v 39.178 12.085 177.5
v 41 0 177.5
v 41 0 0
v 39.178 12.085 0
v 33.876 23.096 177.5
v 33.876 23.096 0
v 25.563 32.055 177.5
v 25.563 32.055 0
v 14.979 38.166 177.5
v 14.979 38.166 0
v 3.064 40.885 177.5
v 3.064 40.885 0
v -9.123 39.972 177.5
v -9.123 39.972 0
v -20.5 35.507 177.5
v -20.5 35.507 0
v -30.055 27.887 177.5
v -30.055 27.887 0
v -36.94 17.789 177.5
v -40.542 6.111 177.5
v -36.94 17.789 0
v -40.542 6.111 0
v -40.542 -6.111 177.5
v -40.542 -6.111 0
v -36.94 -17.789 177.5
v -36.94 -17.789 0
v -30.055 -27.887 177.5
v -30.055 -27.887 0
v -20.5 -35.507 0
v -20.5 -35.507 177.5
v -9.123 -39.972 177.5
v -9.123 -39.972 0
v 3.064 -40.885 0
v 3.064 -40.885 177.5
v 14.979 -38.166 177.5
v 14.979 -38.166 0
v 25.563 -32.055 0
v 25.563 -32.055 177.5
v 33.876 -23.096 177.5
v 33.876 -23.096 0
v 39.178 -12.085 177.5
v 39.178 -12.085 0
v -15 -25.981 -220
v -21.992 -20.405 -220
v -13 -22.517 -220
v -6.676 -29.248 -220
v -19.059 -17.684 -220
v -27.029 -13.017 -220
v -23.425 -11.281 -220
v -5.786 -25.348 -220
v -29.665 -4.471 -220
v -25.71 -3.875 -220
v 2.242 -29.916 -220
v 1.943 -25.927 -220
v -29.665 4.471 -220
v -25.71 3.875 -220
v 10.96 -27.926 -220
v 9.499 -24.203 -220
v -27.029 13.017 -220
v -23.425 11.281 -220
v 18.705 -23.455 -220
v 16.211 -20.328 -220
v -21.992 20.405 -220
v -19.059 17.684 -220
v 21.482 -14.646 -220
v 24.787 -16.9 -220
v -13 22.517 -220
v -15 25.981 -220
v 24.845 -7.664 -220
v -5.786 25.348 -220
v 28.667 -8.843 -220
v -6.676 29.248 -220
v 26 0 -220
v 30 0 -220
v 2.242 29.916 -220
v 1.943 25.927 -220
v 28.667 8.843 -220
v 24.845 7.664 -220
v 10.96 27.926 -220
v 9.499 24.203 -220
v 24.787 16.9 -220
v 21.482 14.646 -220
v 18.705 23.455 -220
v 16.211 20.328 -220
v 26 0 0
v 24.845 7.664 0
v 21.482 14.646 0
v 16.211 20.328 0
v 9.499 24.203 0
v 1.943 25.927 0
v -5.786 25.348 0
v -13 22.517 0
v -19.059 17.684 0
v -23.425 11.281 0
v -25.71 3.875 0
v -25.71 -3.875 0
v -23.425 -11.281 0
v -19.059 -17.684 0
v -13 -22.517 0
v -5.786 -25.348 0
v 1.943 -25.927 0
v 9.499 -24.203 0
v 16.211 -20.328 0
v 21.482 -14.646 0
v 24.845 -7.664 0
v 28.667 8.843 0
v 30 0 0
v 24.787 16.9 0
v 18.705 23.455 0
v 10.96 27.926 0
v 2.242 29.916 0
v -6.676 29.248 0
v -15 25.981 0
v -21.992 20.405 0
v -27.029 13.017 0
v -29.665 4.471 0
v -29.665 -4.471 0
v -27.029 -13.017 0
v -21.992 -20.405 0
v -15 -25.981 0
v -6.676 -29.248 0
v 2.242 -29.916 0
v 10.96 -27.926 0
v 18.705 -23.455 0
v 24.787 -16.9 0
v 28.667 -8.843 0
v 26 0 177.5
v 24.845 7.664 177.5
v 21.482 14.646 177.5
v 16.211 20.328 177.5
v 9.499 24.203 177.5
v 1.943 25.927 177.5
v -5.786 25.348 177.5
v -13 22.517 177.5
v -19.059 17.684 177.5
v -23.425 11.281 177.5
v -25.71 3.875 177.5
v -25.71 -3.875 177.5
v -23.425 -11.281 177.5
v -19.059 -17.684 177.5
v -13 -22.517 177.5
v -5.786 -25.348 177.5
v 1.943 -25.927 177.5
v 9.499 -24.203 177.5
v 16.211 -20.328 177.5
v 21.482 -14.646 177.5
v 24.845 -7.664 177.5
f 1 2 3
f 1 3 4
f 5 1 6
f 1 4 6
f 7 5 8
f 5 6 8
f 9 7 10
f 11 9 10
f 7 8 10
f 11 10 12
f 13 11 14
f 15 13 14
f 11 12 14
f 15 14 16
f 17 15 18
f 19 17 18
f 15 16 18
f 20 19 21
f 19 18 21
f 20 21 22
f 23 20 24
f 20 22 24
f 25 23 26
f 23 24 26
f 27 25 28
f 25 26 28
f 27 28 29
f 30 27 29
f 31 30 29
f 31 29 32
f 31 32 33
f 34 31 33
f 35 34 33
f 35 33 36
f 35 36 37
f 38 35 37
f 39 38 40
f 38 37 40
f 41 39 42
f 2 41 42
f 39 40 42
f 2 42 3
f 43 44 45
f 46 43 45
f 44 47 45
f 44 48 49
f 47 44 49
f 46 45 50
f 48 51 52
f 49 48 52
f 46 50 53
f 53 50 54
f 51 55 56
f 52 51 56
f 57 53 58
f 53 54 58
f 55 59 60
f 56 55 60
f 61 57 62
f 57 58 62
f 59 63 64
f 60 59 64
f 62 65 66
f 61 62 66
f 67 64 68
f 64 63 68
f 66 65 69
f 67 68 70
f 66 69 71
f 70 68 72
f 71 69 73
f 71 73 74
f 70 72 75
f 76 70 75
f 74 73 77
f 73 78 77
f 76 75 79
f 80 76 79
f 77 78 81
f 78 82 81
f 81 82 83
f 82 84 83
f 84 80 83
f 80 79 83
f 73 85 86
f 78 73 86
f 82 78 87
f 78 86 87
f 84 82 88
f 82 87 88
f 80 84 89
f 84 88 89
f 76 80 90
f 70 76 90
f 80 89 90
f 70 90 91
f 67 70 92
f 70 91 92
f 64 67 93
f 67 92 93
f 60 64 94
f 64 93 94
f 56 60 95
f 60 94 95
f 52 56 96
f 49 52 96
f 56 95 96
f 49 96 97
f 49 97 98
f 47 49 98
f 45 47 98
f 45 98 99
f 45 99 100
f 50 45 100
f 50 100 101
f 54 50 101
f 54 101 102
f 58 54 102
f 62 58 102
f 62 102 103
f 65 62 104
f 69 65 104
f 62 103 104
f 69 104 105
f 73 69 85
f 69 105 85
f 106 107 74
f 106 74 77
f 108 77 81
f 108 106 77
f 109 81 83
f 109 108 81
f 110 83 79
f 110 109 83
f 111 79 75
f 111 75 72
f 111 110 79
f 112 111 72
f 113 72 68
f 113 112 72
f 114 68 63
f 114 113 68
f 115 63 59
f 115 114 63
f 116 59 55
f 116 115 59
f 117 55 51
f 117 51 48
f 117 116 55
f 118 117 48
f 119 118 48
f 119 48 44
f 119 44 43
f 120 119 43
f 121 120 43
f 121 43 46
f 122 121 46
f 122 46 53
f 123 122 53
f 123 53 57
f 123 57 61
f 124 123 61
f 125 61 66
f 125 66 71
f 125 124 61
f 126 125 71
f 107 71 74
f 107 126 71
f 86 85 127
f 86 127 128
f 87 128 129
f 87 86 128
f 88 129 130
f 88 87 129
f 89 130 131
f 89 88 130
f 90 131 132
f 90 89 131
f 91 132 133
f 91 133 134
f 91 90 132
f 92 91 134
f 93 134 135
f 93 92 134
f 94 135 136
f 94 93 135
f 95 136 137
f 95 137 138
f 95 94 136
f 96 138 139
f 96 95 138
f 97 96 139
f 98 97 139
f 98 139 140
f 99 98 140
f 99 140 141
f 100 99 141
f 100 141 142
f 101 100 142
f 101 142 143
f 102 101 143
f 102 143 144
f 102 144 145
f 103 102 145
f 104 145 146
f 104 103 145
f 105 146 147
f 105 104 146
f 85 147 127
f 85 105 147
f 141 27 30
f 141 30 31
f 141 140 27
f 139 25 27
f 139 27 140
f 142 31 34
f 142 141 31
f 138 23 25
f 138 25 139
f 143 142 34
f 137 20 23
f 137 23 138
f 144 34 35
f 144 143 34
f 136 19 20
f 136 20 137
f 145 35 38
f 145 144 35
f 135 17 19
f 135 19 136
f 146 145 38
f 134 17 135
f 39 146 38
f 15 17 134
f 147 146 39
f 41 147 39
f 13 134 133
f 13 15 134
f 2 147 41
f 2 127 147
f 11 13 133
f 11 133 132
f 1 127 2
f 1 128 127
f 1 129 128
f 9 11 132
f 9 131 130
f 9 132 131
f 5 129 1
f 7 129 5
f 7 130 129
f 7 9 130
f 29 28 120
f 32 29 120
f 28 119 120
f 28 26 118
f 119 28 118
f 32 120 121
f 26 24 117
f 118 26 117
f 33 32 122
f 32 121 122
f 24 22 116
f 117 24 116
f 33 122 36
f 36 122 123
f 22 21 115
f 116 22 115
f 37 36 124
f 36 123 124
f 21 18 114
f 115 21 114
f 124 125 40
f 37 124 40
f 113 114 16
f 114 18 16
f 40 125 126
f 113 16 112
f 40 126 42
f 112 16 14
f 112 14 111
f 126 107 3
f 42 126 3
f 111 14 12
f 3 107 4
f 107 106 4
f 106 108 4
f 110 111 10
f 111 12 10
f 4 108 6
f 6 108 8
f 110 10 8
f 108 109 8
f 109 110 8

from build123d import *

# Parameters (mm, degrees)
F0_R     = 41
F0_R_2   = 26
F1_DEPTH = 177.5
F2_R     = 30
F2_R_2   = 26
F3_DEPTH = 220


with BuildPart() as f1:
    # F0 (on Top) → F1 (new body)
    with BuildSketch(Plane.XY):
        Circle(F0_R)
        Circle(F0_R_2, mode=Mode.SUBTRACT)
    extrude(amount=F1_DEPTH)

    # F2 (on Top) → F3 (join)
    with BuildSketch(Plane.XY):
        Circle(F2_R)
        Circle(F2_R_2, mode=Mode.SUBTRACT)
    extrude(amount=-F3_DEPTH)


solid = f1.part
